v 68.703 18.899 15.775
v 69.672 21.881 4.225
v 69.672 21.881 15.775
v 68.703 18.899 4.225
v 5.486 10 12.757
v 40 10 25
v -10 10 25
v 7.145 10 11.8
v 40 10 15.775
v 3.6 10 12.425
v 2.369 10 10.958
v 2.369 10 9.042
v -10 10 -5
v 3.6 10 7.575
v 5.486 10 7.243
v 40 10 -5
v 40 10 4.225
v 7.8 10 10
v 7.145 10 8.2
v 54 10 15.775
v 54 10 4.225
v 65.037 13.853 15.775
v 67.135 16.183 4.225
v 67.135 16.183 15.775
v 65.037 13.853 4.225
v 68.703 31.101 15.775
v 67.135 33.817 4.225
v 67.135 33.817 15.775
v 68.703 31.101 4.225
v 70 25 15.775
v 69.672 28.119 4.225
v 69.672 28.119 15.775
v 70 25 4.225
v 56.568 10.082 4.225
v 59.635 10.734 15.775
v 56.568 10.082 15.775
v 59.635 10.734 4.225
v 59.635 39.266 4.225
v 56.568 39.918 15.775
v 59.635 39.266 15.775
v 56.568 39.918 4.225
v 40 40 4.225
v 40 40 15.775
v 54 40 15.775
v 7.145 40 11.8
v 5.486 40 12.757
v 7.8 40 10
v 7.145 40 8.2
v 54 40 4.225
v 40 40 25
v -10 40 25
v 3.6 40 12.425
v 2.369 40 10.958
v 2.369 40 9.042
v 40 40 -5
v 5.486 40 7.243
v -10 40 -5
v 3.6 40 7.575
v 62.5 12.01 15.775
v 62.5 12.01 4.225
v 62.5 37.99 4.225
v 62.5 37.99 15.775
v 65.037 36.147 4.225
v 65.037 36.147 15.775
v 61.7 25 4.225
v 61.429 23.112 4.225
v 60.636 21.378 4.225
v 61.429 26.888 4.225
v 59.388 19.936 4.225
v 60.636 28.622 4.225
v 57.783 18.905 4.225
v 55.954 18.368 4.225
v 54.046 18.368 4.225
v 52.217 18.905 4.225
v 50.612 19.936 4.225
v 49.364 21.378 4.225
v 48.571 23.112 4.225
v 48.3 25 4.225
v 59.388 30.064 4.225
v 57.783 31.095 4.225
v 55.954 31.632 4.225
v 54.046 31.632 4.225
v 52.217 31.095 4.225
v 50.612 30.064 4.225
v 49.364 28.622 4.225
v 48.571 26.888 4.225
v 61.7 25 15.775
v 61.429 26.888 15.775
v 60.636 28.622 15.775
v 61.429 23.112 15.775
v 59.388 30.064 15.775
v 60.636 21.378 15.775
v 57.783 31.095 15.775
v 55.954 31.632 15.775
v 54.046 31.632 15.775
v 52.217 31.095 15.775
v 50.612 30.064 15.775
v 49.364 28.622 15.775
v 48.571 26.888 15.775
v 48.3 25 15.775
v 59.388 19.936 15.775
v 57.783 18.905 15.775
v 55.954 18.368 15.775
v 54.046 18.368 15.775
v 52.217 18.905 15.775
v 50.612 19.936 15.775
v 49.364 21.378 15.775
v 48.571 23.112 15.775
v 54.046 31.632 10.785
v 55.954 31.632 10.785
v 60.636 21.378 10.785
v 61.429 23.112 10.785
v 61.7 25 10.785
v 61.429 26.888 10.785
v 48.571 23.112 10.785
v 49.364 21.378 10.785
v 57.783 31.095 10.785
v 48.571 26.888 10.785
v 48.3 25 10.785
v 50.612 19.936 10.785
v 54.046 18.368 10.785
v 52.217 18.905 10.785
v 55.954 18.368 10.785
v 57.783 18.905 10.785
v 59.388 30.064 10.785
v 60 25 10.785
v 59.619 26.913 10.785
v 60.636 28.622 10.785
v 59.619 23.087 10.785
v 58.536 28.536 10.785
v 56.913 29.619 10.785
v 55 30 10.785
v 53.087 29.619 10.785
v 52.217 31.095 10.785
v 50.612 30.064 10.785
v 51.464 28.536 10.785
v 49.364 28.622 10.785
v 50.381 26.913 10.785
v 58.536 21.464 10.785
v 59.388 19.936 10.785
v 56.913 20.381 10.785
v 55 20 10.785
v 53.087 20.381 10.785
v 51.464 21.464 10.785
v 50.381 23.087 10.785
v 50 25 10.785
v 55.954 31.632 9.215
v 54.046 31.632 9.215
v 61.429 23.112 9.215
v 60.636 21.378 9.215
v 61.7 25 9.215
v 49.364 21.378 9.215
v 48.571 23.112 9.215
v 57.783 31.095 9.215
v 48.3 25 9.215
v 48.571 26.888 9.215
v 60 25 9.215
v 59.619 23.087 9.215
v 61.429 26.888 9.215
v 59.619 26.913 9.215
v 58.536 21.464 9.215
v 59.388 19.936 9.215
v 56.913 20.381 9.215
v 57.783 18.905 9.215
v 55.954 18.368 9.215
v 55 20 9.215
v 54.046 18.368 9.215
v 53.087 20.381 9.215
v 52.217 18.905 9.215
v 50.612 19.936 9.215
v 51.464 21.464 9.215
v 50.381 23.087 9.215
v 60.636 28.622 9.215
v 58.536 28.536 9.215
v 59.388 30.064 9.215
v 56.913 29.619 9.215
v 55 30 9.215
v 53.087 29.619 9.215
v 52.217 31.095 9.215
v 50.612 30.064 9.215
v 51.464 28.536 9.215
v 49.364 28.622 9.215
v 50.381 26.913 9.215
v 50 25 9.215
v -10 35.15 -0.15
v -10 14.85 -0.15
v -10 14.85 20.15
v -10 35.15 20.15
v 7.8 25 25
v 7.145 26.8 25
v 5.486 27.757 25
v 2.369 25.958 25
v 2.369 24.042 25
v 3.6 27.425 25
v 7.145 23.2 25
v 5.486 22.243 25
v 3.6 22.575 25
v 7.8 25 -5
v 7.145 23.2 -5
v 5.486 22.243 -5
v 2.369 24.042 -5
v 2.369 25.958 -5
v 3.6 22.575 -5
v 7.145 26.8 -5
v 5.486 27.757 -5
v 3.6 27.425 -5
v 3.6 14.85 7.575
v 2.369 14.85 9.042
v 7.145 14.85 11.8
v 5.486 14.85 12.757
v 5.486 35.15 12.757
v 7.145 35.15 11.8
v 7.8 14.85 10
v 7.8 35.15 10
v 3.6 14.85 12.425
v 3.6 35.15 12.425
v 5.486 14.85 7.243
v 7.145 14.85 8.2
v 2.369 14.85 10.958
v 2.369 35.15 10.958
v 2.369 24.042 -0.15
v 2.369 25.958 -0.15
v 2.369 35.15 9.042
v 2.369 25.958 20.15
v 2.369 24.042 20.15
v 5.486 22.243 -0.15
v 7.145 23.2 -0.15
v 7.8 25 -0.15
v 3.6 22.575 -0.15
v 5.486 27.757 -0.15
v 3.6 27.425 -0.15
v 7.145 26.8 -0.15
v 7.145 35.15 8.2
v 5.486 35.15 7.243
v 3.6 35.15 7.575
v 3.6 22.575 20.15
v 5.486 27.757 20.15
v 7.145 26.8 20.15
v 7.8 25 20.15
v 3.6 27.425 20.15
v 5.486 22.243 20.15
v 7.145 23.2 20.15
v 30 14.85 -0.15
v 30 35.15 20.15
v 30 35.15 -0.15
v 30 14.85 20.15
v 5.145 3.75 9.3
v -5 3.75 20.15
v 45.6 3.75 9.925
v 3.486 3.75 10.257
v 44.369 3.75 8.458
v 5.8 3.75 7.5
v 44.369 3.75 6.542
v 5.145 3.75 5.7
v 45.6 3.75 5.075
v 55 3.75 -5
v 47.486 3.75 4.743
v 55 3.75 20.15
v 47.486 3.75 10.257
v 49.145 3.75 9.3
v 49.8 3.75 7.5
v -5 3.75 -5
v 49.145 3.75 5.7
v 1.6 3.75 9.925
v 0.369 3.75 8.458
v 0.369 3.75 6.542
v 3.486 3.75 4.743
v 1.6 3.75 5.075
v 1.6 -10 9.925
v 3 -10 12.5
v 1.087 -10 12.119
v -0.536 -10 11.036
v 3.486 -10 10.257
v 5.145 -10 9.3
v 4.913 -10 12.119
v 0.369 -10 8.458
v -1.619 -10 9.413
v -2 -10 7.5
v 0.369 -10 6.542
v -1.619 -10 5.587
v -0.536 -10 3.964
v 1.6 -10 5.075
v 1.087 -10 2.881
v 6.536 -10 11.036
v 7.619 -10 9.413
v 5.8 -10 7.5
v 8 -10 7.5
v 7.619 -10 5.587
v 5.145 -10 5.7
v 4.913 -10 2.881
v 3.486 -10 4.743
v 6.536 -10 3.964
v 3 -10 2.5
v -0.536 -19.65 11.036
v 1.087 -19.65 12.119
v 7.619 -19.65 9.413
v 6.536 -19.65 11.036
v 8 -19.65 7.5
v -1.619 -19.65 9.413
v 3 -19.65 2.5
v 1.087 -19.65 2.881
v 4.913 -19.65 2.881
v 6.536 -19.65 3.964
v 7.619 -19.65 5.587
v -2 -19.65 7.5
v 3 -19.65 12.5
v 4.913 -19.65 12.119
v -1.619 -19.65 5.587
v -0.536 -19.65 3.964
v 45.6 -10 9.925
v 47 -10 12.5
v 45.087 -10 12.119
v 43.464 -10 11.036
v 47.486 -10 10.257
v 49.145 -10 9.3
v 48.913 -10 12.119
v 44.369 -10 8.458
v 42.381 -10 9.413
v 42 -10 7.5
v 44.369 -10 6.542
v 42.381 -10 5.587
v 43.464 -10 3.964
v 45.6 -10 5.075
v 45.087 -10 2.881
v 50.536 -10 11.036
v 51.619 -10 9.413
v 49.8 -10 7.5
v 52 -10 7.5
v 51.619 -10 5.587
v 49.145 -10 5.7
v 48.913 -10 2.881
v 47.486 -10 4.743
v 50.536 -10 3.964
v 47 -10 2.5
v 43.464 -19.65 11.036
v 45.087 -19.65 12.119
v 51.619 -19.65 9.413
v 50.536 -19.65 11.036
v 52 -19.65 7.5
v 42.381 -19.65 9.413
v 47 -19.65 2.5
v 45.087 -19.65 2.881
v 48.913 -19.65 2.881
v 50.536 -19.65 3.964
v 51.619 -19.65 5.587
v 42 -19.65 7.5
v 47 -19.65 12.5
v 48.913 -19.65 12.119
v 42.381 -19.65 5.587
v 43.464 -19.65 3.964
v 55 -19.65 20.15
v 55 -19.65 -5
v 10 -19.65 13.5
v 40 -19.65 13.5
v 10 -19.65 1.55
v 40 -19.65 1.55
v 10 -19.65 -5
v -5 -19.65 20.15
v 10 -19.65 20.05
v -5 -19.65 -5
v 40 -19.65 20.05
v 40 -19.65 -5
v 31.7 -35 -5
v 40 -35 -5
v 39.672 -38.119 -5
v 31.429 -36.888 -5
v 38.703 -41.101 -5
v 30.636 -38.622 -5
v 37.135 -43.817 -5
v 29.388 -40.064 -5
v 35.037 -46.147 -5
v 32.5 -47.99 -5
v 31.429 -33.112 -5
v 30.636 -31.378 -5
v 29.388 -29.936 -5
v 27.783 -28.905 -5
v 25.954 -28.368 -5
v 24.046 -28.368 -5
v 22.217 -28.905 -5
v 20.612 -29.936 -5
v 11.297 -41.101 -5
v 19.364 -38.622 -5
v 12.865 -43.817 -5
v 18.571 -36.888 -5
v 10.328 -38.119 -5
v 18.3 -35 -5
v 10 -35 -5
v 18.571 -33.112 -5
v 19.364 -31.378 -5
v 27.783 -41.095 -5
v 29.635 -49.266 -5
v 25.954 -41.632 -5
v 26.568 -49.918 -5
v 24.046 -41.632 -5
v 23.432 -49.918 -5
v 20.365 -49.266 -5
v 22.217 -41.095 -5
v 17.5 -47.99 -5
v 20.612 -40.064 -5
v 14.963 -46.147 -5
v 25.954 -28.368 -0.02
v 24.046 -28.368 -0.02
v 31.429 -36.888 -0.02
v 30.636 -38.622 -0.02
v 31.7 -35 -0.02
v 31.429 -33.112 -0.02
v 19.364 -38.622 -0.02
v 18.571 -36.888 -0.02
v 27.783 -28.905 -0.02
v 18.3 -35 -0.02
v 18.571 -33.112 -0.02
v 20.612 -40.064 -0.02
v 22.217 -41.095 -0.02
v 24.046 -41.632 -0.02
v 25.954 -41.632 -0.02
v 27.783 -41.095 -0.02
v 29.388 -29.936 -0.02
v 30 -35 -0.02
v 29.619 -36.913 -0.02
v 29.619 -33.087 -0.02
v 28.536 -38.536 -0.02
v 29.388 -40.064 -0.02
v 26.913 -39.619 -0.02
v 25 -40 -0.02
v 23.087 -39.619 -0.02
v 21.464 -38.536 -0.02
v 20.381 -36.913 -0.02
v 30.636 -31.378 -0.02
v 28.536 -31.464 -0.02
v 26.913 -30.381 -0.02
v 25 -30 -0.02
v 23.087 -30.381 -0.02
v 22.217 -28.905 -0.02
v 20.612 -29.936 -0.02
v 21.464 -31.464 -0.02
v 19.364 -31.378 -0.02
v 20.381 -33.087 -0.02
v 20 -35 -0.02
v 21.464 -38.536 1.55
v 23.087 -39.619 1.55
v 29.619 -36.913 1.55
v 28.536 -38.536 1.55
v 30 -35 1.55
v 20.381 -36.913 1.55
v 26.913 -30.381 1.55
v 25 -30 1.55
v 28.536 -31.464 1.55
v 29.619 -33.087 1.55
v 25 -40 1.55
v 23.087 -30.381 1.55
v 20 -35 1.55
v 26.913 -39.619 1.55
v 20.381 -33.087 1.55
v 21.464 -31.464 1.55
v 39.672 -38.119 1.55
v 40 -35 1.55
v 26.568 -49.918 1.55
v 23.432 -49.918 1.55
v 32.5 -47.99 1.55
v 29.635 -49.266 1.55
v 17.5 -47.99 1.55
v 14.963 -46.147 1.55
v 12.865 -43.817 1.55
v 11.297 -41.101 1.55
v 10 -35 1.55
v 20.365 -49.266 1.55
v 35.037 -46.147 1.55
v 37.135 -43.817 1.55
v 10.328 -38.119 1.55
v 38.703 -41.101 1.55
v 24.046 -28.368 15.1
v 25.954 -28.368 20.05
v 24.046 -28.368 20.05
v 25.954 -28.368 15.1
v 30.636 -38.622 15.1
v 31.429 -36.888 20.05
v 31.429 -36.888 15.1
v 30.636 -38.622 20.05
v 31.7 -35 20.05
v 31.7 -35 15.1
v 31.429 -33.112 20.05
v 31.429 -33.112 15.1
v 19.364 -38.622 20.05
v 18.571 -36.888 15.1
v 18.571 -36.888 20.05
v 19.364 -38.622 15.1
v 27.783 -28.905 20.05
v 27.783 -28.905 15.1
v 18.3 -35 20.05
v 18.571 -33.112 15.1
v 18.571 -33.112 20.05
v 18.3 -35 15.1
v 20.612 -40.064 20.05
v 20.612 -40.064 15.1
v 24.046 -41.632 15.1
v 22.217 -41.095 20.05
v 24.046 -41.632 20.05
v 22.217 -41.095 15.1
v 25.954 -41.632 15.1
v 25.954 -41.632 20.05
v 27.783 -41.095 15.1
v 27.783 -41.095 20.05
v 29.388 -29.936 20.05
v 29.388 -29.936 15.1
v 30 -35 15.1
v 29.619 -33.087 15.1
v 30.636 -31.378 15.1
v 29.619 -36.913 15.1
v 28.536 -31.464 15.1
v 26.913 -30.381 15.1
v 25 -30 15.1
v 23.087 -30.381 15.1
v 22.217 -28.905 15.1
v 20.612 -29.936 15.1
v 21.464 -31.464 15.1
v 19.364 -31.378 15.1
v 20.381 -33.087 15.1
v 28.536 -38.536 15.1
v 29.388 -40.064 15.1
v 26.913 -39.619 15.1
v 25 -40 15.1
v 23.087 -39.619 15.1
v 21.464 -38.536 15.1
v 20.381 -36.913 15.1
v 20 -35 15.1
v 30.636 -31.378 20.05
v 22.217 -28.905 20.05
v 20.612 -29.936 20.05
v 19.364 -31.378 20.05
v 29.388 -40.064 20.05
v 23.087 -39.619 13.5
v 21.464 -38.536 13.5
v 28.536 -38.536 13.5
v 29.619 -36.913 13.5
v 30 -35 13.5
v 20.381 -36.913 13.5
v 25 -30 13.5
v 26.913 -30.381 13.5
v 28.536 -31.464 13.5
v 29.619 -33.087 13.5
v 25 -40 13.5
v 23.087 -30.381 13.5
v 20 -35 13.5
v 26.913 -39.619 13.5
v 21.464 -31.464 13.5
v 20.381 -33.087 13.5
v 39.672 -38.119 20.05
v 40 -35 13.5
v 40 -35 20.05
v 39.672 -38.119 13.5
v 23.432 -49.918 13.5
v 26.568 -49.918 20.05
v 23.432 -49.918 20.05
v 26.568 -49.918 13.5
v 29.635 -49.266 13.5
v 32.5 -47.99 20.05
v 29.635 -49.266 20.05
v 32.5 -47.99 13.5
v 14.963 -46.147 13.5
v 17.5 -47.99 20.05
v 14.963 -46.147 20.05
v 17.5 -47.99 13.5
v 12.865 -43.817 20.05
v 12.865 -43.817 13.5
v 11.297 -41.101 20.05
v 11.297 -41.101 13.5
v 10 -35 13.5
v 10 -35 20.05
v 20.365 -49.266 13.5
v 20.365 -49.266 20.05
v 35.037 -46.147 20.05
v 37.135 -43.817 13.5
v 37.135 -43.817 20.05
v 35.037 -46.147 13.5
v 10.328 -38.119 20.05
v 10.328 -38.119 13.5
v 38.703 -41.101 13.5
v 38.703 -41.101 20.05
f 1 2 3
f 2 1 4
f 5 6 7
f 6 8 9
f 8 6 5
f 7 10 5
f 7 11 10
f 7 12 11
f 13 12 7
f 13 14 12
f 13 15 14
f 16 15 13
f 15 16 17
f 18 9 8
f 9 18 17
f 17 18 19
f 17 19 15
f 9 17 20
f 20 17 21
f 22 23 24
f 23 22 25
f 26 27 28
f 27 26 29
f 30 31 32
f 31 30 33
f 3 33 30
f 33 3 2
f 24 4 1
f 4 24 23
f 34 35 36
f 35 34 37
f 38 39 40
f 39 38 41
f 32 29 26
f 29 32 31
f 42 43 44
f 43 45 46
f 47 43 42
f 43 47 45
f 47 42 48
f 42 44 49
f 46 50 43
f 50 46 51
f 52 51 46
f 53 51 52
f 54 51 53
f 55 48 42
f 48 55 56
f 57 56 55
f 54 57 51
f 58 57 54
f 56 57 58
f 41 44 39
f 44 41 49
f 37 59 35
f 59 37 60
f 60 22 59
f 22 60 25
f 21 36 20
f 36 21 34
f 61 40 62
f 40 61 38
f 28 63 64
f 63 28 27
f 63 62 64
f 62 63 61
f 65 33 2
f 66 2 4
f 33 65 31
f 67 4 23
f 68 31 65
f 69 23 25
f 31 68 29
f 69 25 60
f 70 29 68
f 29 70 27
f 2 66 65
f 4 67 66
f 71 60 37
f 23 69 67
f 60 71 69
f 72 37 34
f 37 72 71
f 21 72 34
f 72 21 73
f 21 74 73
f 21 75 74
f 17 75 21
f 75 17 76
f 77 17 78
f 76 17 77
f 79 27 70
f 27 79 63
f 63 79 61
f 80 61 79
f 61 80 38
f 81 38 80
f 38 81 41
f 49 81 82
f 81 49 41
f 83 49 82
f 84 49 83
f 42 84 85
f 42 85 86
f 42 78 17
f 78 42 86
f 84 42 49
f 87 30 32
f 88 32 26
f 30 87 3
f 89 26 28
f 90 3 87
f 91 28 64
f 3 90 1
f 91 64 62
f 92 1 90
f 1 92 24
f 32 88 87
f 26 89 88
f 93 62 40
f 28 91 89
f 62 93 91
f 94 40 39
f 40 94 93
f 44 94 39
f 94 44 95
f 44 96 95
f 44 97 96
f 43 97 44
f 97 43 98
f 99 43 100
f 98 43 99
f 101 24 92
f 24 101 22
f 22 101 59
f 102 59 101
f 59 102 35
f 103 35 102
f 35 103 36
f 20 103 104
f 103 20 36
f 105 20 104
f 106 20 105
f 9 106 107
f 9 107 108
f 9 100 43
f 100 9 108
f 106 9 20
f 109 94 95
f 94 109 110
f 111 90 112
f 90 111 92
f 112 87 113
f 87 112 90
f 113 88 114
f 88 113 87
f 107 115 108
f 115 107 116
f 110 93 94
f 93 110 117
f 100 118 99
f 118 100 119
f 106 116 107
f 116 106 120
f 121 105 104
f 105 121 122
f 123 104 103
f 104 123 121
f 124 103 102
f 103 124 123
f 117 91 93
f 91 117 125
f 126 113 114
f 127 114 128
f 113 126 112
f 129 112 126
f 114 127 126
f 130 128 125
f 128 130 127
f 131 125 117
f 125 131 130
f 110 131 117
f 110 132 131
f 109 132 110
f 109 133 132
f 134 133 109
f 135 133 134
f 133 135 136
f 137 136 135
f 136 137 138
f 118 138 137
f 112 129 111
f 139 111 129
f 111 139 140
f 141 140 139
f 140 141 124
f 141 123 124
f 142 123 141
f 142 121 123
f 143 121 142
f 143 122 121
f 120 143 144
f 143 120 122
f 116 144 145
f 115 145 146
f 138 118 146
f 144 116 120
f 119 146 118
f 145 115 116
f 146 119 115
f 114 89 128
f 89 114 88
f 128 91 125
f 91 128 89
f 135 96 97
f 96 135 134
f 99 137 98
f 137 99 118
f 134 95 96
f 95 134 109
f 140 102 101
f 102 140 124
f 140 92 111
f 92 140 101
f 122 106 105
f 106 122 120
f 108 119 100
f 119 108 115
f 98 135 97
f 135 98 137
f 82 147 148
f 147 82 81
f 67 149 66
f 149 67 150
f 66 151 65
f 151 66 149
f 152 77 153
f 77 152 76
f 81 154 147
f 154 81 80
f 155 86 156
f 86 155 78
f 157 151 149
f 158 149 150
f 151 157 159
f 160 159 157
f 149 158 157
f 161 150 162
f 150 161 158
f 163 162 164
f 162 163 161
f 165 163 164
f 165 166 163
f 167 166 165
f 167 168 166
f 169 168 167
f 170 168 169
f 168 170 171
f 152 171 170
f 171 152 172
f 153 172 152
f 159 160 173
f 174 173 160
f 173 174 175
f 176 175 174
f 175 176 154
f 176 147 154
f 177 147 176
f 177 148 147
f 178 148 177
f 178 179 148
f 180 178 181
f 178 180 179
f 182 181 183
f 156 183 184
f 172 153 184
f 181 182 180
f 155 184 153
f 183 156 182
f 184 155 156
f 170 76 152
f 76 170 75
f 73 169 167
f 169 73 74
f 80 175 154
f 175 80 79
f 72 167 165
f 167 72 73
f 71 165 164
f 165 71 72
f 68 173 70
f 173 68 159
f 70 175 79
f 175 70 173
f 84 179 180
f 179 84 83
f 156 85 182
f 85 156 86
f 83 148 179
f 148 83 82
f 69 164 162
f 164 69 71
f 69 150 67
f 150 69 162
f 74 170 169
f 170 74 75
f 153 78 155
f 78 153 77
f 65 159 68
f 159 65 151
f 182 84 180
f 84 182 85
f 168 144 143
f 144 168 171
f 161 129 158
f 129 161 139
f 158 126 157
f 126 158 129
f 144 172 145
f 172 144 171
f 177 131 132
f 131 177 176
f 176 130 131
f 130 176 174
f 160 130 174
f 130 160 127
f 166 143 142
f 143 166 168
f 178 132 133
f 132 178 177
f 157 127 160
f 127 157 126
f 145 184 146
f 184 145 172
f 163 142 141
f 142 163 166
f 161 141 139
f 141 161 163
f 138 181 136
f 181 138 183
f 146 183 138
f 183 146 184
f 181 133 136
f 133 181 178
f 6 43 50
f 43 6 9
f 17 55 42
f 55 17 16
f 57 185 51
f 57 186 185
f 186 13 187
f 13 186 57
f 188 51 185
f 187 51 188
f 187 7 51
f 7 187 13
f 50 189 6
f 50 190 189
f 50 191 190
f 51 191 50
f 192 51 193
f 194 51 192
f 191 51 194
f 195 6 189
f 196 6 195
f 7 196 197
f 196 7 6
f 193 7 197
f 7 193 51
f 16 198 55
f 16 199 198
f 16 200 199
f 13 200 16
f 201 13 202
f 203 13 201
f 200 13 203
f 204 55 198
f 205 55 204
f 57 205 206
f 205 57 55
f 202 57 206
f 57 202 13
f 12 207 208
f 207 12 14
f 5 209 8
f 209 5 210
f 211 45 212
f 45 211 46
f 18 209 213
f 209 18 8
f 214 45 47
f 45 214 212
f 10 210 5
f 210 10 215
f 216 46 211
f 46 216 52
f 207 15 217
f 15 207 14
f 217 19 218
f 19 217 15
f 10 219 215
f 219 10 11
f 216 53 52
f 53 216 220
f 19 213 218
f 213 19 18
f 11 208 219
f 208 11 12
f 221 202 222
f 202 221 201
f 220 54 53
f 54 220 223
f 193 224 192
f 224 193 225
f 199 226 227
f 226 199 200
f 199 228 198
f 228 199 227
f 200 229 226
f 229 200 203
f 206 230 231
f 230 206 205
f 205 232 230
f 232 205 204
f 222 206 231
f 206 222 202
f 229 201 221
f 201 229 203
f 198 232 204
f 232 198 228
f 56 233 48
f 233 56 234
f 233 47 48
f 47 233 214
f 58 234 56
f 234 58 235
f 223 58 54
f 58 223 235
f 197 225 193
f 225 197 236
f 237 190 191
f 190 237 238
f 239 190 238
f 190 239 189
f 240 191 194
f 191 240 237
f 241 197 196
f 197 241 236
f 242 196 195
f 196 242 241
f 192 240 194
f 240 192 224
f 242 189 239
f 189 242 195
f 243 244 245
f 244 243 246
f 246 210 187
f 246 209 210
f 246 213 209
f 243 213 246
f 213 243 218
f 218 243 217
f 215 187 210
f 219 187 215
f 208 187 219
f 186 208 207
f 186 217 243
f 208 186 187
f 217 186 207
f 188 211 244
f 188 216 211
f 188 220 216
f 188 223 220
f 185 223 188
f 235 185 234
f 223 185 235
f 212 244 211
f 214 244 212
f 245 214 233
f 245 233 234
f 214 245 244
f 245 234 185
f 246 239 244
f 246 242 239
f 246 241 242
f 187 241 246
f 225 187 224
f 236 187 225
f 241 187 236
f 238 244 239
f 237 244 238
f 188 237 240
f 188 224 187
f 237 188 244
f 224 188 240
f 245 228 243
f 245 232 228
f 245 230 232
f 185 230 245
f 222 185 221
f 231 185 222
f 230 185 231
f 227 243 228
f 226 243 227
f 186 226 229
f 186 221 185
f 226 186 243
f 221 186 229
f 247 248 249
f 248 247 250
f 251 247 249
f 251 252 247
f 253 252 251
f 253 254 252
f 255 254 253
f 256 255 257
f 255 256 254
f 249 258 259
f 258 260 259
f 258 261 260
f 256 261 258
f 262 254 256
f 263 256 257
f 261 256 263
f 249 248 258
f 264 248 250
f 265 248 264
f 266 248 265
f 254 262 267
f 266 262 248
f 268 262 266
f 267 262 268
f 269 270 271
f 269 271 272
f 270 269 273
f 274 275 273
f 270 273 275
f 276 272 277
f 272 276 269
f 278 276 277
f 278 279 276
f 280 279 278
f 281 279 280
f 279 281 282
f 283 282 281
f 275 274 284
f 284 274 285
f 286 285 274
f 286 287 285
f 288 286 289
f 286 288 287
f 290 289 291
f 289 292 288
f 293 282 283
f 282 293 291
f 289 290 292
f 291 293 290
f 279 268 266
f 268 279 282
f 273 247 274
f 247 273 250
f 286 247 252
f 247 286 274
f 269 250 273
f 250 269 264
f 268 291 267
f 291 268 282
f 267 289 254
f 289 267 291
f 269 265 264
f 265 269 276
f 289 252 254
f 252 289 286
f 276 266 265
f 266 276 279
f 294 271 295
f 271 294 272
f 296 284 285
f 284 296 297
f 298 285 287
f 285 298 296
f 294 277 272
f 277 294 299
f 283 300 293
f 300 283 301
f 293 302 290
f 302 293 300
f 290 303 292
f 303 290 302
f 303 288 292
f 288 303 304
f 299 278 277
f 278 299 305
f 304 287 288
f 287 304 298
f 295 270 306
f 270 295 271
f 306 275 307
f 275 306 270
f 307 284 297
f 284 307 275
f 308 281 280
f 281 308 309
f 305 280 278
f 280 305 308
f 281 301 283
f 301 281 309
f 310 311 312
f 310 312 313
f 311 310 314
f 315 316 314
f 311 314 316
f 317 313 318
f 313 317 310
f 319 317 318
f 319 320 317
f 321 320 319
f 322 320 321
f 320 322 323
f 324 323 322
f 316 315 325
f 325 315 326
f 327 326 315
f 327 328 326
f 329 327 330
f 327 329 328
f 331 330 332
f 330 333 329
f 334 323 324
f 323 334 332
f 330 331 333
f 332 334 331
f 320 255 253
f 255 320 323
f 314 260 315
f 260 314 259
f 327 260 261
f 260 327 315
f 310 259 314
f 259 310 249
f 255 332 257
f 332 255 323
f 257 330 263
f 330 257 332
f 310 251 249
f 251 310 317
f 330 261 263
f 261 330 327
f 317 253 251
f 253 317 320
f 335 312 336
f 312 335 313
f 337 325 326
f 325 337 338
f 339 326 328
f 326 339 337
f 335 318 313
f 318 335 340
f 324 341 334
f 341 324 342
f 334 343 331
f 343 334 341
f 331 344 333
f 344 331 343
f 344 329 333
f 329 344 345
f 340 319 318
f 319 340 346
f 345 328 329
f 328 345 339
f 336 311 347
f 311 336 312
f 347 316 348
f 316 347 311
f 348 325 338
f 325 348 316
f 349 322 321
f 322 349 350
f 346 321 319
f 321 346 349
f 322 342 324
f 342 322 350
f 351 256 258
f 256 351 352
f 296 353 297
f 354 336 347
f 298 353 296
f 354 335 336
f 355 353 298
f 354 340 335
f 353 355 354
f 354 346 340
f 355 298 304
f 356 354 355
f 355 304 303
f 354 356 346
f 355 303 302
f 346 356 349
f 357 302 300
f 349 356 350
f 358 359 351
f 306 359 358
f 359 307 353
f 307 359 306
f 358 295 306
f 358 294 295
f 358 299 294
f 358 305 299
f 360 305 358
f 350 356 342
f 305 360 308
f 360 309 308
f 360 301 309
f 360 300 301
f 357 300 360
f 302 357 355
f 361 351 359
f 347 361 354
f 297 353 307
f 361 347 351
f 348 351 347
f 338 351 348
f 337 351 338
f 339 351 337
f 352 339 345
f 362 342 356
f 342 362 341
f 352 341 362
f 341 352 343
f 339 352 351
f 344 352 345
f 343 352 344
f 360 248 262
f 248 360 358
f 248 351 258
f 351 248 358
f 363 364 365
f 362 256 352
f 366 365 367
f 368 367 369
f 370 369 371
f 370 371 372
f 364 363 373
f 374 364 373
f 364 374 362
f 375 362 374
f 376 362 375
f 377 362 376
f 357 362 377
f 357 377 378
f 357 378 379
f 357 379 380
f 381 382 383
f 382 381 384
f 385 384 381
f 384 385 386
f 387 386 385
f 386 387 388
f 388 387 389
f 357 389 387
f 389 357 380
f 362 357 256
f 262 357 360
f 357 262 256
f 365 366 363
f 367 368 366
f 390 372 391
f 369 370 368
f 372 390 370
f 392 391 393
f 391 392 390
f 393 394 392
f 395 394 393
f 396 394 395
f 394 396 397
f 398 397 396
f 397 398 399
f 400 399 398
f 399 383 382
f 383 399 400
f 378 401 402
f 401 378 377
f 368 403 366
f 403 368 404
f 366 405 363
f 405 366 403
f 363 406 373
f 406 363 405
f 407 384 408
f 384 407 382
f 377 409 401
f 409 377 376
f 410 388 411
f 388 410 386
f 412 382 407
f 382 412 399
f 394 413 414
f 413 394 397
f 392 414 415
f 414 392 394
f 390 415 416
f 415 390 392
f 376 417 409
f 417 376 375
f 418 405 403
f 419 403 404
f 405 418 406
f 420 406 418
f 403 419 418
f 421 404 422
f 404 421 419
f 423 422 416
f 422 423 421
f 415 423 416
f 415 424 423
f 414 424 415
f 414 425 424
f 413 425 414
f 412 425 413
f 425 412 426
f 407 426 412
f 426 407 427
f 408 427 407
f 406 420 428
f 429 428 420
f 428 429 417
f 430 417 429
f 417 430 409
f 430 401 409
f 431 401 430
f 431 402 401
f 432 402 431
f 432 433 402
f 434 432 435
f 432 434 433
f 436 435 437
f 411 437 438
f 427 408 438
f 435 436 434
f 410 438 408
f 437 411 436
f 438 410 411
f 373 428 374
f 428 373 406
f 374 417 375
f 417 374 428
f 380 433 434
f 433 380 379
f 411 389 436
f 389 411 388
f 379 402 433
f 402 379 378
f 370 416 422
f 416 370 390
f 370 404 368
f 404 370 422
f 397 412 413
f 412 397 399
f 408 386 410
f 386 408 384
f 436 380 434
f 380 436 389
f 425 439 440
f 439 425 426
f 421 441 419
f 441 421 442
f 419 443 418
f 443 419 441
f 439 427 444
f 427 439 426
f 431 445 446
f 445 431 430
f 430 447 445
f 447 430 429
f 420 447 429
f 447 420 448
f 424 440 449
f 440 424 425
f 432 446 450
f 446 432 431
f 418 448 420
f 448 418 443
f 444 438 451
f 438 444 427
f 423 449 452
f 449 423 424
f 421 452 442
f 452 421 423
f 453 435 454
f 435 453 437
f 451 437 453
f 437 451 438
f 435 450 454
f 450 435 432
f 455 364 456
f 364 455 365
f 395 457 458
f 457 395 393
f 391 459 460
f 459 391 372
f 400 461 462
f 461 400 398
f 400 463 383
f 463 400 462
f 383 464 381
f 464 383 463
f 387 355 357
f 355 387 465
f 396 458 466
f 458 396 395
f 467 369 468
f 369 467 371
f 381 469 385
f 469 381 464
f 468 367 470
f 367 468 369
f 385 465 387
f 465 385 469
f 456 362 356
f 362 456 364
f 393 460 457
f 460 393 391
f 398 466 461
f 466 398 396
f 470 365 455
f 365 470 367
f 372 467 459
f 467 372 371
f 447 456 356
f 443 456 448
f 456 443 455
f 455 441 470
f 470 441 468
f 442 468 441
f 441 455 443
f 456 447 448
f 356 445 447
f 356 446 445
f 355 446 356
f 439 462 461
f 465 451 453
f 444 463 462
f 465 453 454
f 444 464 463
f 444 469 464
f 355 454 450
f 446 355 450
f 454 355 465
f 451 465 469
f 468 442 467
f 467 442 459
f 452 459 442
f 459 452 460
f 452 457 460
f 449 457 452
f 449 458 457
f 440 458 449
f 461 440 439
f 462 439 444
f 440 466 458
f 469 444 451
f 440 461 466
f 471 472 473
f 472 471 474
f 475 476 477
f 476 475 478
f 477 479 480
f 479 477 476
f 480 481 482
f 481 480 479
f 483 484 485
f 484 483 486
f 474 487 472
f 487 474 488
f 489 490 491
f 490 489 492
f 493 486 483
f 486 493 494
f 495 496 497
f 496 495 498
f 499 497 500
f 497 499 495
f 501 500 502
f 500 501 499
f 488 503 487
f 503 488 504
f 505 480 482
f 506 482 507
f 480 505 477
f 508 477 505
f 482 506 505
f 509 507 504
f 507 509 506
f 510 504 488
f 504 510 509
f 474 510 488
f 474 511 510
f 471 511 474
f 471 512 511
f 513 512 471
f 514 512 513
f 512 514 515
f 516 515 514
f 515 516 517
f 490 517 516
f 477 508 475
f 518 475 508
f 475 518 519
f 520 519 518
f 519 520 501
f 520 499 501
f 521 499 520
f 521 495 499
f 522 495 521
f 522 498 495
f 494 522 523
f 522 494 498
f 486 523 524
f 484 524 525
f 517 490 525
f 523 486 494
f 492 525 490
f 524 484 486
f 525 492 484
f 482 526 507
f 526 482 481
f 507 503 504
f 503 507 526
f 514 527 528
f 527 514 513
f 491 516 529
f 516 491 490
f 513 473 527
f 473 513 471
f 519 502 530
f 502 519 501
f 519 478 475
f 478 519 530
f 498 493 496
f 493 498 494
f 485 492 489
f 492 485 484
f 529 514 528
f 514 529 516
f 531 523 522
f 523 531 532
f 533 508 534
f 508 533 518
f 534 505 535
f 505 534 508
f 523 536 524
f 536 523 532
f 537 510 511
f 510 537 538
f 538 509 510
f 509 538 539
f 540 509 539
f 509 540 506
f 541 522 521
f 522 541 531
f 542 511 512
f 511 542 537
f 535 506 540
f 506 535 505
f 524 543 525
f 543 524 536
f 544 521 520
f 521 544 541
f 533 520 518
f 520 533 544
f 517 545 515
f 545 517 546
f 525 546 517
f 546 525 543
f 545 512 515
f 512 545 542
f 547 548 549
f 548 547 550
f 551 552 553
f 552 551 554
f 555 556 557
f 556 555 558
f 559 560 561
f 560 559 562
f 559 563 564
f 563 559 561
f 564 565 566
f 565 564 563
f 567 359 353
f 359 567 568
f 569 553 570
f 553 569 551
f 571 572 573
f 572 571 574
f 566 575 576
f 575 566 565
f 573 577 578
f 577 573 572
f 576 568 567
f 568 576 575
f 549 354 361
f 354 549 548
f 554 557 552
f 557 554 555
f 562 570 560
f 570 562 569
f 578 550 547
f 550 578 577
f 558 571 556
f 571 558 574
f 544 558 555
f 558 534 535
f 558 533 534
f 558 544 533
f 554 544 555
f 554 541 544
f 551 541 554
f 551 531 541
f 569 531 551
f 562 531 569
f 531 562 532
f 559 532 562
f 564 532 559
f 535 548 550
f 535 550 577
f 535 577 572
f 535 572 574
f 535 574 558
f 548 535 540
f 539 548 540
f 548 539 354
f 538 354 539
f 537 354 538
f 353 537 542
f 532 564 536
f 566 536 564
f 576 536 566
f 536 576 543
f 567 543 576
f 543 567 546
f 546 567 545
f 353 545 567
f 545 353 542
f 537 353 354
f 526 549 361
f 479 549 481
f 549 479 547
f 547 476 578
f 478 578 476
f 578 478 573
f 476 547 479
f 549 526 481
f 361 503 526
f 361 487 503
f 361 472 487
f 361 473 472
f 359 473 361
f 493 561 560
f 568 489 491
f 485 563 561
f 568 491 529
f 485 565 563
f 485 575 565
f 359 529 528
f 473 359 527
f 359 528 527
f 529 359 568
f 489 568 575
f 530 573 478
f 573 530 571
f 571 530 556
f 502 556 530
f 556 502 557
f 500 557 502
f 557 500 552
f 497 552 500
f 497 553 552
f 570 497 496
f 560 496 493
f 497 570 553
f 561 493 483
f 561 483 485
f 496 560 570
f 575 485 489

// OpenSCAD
//include <bearing.scad>;
//include <screw.scad>;

wheelDiameter=77.5;
wheelRadius=wheelDiameter/2;
clearance=0.15;
//profileWidth = 20+(clearance*2);
profileWidth = 20;
screwSpace = 15;
wallThickness = 5;
bockLength=60;


axisBodyDiameter = 20+(2*wallThickness);
axisBodyRadius = axisBodyDiameter/2;

axisDiameter = 10;
axisRadius = axisDiameter/2;

axisInsideWidth=11.55;
axisOutsideWidthHalf=6.55;

//axis_width=24.65;
axis_width=axisInsideWidth+(2*axisOutsideWidthHalf);


profileHeight=20;
slotWidth=4.5;
slotHeight=0.6;

bearingWidth=5;

production=true;

getMain();

	
module getMain() {
	if(production){
		translate([30,60,0])rotate([90,0,0])
		axisOne();
		translate([0,0,-2.5])rotate([90,0,0])
		axisTwo();
	} else {
		axisOne();
		axisTwo();
	}
}

module axisTwo() {
	union(){
		
		difference(){
			translate([-5,-2.5,-5])cube([bockLength,axis_width+0.5,axis_width]);
			translate([-bockLength/2,-5,-5-wheelRadius])profile5_40x40(100);
			#translate([3,10,-10])m5Screw(20);
			#translate([47,10,-10])m5Screw(20);
		}
		
		difference(){
			bugel();
					translate([25,-2.52,35])mirror([0,1,0])union(){
						rotate([90,0,0])bearing();
						rotate([90,0,0])cylinder(h=axisInsideWidth,r=axisRadius);
					}
		}
		translate([0,18.5,0])difference(){
			bugel();
			translate([25,4.1,35])union(){
				rotate([90,0,0])bearing();
				rotate([90,0,0])cylinder(h=axisInsideWidth,r=axisRadius);
			}
		}

	}
    
    
}



module bugel() {
			hull(){
				translate([10,-2.5,18])cube([30,axisOutsideWidthHalf,17]);	
				translate([25,-2.5,35])mirror([0,1,0])rotate([90,0,0])cylinder(h=axisOutsideWidthHalf,r=axisBodyRadius);
			}

}

module axisOne() {
		union(){
			translate([25,axisInsideWidth+(10-axisInsideWidth/2),35])axisInsideConector();
			difference(){
				translate([-40,-wallThickness,profileWidth])plug20x20(50);
				#translate([-25,(profileWidth)/2,35])rotate([0,0,0])m5Hole(25);
				translate([-25,(profileWidth)/2,35])rotate([90,0,0])m5Hole(25);
				#translate([-25,(profileWidth)/2,35])rotate([180,0,0])m5Hole(25);
				translate([-25,(profileWidth)/2,35])rotate([270,0,0])m5Hole(25);
				translate([-100,-clearance,(profileWidth+wallThickness)-clearance])cube([100,profileWidth+(clearance*2),profileWidth+(clearance*2)]);
			}
		}
}

module axisInsideConector() {
	difference(){
	   hull(){
		   translate([-16,-11.55,-15])cube([15,axisInsideWidth,20+(wallThickness*2)]);
		   rotate([90,0,0])cylinder(h=axisInsideWidth,r=axisBodyRadius);
	   }
	   translate([0,0.01,0])rotate([90,0,0])bearing();
		translate([0,-axisInsideWidth+bearingWidth-0.01,0])rotate([90,0,0])bearing();
		translate([0,0,0])rotate([90,0,0])cylinder(h=axisInsideWidth,r=axisRadius);
   }
}
module axisInside() {
	difference(){
		rotate([90,0,0])bearing();
		translate([0,-axisInsideWidth+bearingWidth,0])rotate([90,0,0])bearing();
		translate([0,0,0])rotate([90,0,0])cylinder(h=axisInsideWidth,r=axisRadius);
	}
}
//module axisOutside() {
//		rotate([90,0,0])cylinder(h=axisOutsideWidthHalf,r=axisBodyRadius);
//}

module bearing() {
	cylinder(h=bearingWidth,r=13.4/2);
}


module m5Screw(h=10) {
	union() {
		cylinder(h=h,r=2.8);
		translate([0,0,h])cylinder(h=20,r=5);
	}
}

module m5Hole(h=20) {
	union() {
		cylinder(h=h,r=2.8);
//		translate([0,0,h])cylinder(h=20,r=5);
	}
}

module plug20x20(l=100) {
	cube([l,20+(2*wallThickness),20+(2*wallThickness)]);
   	
}

module profile5_20x20(l=100) {
	difference(){
		cube([l,profileWidth,profileWidth]);
	}
	
}

module profile5_40x40(l=100) {
	union(){
		profile5_20x20(l);
		translate([0,20,0])profile5_20x20(l);
		translate([0,20,20])profile5_20x20(l);
		translate([0,0,20])profile5_20x20(l);
	}
	
}
